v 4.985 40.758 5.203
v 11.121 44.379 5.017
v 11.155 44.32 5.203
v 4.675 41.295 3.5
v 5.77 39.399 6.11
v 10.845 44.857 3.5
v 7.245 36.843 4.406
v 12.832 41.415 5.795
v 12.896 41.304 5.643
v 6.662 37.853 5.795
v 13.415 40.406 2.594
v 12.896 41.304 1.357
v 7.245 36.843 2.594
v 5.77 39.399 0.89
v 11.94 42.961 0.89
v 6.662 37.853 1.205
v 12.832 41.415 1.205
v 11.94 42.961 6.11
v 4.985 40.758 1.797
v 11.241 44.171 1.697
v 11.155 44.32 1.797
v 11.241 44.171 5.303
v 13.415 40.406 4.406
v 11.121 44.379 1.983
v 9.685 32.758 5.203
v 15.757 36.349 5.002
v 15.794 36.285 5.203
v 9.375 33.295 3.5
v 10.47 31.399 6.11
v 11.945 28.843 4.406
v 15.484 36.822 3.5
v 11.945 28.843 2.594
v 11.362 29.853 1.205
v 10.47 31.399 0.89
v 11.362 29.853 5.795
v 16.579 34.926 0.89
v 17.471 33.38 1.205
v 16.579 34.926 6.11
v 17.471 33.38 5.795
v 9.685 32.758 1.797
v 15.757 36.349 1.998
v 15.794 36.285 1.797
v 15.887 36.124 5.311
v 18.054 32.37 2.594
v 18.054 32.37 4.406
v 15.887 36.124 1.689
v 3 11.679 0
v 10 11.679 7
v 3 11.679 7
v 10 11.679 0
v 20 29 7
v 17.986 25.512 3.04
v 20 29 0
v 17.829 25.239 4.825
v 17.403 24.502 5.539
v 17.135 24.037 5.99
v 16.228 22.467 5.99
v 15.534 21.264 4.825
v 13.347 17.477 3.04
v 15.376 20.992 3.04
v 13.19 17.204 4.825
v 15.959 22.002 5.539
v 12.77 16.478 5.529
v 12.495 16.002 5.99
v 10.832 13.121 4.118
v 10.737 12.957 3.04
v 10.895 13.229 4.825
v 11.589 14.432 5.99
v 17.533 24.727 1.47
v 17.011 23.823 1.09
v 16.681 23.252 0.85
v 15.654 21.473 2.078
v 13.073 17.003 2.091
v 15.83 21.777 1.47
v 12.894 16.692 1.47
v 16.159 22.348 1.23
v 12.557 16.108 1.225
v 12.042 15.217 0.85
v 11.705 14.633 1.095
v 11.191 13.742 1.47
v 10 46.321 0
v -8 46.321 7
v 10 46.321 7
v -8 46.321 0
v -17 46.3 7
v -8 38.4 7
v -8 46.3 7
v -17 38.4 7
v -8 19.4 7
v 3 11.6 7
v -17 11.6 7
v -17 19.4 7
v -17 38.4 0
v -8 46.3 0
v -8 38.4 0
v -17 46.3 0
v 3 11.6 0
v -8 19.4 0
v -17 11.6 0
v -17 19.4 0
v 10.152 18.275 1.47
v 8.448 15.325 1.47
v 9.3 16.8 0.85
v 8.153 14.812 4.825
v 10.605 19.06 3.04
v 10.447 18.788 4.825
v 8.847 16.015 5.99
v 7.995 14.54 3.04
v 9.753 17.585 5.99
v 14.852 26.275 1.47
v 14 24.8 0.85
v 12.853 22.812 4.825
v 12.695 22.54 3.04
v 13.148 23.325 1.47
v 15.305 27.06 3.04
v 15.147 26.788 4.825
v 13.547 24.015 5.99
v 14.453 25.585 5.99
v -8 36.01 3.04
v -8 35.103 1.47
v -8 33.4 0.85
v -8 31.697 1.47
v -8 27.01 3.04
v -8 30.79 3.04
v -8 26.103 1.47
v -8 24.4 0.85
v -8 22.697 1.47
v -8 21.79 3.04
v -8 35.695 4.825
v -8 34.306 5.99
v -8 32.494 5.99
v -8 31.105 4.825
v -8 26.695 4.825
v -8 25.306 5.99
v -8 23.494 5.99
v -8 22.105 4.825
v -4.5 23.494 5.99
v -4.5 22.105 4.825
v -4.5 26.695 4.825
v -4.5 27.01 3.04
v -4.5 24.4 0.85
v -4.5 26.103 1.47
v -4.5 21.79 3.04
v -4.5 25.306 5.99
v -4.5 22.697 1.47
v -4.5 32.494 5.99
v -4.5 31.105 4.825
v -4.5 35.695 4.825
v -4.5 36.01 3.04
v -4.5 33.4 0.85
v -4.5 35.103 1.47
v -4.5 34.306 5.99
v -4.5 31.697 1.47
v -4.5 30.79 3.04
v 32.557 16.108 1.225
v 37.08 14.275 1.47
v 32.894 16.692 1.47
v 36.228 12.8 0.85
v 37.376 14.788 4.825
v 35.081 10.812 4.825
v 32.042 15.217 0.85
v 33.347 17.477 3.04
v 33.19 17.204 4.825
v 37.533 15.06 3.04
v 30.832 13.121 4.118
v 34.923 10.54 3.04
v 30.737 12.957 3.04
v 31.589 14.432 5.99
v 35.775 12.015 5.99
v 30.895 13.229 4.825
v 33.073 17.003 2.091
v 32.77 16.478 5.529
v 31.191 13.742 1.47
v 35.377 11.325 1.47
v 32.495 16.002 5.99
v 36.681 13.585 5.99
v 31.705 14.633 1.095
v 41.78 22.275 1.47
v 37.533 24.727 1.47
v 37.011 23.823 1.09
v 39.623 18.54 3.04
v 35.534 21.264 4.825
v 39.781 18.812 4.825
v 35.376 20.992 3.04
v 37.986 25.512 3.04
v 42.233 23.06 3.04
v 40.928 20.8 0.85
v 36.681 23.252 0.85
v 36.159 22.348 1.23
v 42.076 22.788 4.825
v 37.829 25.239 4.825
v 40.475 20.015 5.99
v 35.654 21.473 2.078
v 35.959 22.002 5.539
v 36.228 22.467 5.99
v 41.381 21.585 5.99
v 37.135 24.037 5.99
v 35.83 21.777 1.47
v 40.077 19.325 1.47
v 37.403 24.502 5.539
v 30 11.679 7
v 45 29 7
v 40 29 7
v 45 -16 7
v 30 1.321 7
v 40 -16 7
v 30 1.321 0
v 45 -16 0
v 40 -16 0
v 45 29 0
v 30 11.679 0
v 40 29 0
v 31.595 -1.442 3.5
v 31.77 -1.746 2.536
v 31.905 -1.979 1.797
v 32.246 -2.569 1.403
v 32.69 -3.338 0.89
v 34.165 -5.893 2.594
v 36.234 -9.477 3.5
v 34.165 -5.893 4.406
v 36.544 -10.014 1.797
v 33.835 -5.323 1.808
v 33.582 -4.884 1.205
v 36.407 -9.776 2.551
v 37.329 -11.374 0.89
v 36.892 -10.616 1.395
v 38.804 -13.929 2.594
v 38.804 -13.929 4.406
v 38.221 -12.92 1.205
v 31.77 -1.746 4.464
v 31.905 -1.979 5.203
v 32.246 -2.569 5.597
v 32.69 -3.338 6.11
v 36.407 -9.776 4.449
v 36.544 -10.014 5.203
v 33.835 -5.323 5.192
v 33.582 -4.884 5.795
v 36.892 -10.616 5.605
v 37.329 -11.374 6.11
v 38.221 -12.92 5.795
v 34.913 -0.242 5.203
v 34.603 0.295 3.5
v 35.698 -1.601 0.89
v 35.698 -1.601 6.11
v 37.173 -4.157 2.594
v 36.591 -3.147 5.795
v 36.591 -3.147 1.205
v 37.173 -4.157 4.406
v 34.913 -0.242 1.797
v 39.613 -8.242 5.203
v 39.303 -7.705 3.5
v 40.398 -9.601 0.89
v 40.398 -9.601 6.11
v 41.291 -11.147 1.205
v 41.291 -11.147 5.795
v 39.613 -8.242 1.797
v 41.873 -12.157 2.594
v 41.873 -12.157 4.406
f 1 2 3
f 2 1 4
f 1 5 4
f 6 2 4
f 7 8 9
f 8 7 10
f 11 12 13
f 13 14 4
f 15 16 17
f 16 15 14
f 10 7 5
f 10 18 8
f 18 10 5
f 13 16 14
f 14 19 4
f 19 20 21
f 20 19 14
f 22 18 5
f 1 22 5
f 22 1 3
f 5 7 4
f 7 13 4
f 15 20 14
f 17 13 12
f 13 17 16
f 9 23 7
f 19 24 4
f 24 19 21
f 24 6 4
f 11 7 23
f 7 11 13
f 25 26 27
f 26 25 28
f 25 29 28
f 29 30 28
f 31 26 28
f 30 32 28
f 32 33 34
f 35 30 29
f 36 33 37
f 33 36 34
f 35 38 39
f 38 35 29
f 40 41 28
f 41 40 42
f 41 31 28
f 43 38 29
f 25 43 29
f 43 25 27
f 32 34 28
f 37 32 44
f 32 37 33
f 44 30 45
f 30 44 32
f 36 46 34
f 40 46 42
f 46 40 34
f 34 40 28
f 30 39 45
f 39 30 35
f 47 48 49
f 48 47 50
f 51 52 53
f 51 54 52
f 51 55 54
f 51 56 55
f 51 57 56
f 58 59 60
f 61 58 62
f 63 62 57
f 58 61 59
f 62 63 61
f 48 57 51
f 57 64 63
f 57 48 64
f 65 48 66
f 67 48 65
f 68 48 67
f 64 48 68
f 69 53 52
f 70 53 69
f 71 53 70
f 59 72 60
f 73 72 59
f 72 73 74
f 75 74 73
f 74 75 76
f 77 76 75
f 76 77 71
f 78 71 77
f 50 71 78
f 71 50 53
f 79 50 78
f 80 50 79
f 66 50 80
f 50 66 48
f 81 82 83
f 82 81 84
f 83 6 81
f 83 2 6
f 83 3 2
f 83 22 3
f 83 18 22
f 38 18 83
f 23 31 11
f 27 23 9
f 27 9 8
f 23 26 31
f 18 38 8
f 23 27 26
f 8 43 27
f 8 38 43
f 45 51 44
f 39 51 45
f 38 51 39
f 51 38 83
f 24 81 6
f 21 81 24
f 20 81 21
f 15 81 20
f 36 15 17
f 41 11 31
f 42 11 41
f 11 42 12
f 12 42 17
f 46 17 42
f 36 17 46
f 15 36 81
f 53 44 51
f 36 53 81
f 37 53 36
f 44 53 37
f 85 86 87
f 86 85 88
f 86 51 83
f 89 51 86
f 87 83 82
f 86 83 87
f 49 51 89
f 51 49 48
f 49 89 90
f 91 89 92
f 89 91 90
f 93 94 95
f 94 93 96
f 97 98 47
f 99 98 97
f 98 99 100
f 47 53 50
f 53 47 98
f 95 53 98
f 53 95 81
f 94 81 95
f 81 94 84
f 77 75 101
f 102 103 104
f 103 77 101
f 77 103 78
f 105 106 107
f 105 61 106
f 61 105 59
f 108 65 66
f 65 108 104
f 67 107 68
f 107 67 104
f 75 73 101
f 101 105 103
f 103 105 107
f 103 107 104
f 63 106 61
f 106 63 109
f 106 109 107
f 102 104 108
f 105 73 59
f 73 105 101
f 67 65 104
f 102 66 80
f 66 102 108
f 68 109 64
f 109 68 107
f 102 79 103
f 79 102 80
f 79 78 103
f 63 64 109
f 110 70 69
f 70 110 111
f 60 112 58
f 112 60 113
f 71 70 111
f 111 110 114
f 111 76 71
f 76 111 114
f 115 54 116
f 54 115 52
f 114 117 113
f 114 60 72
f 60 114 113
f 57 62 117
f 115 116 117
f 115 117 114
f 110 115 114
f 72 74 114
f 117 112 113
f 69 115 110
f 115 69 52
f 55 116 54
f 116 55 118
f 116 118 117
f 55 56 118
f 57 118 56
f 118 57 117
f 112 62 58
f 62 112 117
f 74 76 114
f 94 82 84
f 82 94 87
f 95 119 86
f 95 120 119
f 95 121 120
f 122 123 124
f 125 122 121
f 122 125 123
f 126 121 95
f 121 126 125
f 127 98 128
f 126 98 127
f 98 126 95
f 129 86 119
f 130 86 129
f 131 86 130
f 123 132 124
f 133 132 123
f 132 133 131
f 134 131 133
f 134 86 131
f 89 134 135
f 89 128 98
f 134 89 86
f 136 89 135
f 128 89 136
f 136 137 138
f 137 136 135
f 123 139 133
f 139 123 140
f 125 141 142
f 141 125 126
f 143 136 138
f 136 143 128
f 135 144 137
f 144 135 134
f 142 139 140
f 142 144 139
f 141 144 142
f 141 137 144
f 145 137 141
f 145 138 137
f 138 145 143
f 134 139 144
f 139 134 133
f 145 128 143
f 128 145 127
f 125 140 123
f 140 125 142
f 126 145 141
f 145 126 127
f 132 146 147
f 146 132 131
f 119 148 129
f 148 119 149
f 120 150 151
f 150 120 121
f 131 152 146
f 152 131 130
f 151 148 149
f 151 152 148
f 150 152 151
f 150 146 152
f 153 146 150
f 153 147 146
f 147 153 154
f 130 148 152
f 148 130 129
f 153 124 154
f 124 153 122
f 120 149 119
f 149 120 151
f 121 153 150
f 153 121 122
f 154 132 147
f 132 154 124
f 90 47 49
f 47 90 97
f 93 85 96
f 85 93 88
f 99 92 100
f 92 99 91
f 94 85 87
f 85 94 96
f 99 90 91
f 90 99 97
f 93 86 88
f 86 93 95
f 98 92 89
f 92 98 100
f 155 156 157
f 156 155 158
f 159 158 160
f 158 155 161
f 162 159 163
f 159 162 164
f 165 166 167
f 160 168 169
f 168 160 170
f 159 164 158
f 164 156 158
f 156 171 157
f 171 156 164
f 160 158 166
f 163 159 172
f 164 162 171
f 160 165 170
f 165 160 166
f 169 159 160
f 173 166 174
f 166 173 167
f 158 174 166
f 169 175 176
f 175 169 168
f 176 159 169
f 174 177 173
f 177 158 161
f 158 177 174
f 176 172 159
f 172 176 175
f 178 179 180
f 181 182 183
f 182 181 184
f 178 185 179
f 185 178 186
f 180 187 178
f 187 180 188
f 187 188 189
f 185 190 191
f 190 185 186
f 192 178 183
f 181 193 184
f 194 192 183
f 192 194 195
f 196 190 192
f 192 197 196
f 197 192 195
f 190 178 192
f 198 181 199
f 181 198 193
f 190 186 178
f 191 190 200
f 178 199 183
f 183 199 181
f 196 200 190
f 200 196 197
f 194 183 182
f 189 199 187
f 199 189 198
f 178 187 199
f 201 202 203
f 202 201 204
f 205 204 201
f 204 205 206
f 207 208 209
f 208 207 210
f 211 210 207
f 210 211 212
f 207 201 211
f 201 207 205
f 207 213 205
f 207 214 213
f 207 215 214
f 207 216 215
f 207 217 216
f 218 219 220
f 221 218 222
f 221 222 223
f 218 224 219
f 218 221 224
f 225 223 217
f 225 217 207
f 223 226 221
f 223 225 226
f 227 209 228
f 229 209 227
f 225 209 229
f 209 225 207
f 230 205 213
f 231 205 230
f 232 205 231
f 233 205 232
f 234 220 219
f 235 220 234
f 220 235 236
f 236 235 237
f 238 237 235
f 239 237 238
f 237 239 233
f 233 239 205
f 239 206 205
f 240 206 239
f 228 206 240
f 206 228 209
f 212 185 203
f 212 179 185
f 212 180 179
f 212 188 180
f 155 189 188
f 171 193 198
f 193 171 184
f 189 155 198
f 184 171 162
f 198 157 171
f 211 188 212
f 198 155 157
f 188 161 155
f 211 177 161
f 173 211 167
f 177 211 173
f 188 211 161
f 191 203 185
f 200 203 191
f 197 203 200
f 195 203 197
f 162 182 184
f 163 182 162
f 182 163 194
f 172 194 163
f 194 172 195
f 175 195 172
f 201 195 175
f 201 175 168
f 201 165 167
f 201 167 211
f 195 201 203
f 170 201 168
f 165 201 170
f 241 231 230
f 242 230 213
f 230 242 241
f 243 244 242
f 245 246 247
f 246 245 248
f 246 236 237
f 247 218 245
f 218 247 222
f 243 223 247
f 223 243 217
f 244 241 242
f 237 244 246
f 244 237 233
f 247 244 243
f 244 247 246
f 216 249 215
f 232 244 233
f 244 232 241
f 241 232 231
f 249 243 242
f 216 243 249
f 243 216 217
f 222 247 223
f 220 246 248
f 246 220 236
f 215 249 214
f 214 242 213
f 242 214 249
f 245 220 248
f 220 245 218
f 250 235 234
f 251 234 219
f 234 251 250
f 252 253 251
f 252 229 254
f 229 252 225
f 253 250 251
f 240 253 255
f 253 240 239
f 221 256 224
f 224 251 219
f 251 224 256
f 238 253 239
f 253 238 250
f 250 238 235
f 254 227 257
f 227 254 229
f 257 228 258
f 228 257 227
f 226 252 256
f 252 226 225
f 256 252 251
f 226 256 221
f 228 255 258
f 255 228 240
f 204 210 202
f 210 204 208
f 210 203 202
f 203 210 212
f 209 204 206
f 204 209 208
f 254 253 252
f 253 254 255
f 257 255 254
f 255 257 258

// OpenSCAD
z=7; //высота
g=3.5; //глубина дырок 

//дексибироза
translate ([0,79,0]) {
difference () {
translate([0,-50,0])cylinder(z,20,20, $fn=6);
translate ([9.3,-62.2,3.5])rotate([0,90,-30])cylinder (4.5+g,2.65,2.65);
translate ([14,-54.2,3.5])rotate([0,90,-30])cylinder (4.5+g,2.65,2.65);
translate ([-28,-73,-1])cube ([20,45,9]);
rotate([0, 90, 0]) translate([-3.5,-54.6,-17+g]) cylinder(9,2.65,2.65);        
rotate([0, 90, 0]) translate([-3.5,-45.6,-17+g]) cylinder(9,2.65,2.65);        
translate ([2,-80,0]) {
translate ([4,40,g])rotate ([90,0,120])cylinder(4.5+g,2.65,2.65);   
translate ([4+4.7,37.5+-9+g,g])rotate ([90,0,120])cylinder(4.5+3.5,2.65,2.65); 
  }  
 }
difference () {
translate ([-17,-67.4,0])cube ([20,34.7,7]);
translate ([-20,-59.6,-1])cube ([20,19,12]);
 }
}

//фосфор
translate ([25,-46,0]) {
difference () {
translate ([5,30,0])cube ([10,45,z]);
translate ([-5,125,0]) {
translate ([9.3,-62.2,3.5])rotate([0,90,-30])cylinder (4.5+g,2.65,2.65);
translate ([14,-54.2,3.5])rotate([0,90,-30])cylinder (4.5+g,2.65,2.65);
}
translate([-5,30,-1])cylinder(z+2,20,20,$fn=6);
translate([-5,75,-1])cylinder(z+2,20,20,$fn=6);
translate ([4,40,g])rotate ([90,0,120])cylinder(4.5+g,2.65,2.65);   
translate ([4+4.7,37.5+-9+g,3.5])rotate ([90,0,120])cylinder(4.5+3.5,2.65,2.65); 
  }
//вырезание дырки из доп части от фосфра
difference () {
translate ([15,30,0])cube ([5,45,z]);
translate ([-5,125,0]) {
translate ([9.3,-62.2,3.5])rotate([0,90,-30])cylinder (4.5+g,2.65,2.65);
translate ([14,-54.2,3.5])rotate([0,90,-30])cylinder (4.5+g,2.65,2.65);
}
translate ([9.7-5,-9+g,0]) {
translate ([4,37.5,g])rotate ([90,0,120])cylinder(4.5+g,2.65,2.65); 
  }
 }
}
